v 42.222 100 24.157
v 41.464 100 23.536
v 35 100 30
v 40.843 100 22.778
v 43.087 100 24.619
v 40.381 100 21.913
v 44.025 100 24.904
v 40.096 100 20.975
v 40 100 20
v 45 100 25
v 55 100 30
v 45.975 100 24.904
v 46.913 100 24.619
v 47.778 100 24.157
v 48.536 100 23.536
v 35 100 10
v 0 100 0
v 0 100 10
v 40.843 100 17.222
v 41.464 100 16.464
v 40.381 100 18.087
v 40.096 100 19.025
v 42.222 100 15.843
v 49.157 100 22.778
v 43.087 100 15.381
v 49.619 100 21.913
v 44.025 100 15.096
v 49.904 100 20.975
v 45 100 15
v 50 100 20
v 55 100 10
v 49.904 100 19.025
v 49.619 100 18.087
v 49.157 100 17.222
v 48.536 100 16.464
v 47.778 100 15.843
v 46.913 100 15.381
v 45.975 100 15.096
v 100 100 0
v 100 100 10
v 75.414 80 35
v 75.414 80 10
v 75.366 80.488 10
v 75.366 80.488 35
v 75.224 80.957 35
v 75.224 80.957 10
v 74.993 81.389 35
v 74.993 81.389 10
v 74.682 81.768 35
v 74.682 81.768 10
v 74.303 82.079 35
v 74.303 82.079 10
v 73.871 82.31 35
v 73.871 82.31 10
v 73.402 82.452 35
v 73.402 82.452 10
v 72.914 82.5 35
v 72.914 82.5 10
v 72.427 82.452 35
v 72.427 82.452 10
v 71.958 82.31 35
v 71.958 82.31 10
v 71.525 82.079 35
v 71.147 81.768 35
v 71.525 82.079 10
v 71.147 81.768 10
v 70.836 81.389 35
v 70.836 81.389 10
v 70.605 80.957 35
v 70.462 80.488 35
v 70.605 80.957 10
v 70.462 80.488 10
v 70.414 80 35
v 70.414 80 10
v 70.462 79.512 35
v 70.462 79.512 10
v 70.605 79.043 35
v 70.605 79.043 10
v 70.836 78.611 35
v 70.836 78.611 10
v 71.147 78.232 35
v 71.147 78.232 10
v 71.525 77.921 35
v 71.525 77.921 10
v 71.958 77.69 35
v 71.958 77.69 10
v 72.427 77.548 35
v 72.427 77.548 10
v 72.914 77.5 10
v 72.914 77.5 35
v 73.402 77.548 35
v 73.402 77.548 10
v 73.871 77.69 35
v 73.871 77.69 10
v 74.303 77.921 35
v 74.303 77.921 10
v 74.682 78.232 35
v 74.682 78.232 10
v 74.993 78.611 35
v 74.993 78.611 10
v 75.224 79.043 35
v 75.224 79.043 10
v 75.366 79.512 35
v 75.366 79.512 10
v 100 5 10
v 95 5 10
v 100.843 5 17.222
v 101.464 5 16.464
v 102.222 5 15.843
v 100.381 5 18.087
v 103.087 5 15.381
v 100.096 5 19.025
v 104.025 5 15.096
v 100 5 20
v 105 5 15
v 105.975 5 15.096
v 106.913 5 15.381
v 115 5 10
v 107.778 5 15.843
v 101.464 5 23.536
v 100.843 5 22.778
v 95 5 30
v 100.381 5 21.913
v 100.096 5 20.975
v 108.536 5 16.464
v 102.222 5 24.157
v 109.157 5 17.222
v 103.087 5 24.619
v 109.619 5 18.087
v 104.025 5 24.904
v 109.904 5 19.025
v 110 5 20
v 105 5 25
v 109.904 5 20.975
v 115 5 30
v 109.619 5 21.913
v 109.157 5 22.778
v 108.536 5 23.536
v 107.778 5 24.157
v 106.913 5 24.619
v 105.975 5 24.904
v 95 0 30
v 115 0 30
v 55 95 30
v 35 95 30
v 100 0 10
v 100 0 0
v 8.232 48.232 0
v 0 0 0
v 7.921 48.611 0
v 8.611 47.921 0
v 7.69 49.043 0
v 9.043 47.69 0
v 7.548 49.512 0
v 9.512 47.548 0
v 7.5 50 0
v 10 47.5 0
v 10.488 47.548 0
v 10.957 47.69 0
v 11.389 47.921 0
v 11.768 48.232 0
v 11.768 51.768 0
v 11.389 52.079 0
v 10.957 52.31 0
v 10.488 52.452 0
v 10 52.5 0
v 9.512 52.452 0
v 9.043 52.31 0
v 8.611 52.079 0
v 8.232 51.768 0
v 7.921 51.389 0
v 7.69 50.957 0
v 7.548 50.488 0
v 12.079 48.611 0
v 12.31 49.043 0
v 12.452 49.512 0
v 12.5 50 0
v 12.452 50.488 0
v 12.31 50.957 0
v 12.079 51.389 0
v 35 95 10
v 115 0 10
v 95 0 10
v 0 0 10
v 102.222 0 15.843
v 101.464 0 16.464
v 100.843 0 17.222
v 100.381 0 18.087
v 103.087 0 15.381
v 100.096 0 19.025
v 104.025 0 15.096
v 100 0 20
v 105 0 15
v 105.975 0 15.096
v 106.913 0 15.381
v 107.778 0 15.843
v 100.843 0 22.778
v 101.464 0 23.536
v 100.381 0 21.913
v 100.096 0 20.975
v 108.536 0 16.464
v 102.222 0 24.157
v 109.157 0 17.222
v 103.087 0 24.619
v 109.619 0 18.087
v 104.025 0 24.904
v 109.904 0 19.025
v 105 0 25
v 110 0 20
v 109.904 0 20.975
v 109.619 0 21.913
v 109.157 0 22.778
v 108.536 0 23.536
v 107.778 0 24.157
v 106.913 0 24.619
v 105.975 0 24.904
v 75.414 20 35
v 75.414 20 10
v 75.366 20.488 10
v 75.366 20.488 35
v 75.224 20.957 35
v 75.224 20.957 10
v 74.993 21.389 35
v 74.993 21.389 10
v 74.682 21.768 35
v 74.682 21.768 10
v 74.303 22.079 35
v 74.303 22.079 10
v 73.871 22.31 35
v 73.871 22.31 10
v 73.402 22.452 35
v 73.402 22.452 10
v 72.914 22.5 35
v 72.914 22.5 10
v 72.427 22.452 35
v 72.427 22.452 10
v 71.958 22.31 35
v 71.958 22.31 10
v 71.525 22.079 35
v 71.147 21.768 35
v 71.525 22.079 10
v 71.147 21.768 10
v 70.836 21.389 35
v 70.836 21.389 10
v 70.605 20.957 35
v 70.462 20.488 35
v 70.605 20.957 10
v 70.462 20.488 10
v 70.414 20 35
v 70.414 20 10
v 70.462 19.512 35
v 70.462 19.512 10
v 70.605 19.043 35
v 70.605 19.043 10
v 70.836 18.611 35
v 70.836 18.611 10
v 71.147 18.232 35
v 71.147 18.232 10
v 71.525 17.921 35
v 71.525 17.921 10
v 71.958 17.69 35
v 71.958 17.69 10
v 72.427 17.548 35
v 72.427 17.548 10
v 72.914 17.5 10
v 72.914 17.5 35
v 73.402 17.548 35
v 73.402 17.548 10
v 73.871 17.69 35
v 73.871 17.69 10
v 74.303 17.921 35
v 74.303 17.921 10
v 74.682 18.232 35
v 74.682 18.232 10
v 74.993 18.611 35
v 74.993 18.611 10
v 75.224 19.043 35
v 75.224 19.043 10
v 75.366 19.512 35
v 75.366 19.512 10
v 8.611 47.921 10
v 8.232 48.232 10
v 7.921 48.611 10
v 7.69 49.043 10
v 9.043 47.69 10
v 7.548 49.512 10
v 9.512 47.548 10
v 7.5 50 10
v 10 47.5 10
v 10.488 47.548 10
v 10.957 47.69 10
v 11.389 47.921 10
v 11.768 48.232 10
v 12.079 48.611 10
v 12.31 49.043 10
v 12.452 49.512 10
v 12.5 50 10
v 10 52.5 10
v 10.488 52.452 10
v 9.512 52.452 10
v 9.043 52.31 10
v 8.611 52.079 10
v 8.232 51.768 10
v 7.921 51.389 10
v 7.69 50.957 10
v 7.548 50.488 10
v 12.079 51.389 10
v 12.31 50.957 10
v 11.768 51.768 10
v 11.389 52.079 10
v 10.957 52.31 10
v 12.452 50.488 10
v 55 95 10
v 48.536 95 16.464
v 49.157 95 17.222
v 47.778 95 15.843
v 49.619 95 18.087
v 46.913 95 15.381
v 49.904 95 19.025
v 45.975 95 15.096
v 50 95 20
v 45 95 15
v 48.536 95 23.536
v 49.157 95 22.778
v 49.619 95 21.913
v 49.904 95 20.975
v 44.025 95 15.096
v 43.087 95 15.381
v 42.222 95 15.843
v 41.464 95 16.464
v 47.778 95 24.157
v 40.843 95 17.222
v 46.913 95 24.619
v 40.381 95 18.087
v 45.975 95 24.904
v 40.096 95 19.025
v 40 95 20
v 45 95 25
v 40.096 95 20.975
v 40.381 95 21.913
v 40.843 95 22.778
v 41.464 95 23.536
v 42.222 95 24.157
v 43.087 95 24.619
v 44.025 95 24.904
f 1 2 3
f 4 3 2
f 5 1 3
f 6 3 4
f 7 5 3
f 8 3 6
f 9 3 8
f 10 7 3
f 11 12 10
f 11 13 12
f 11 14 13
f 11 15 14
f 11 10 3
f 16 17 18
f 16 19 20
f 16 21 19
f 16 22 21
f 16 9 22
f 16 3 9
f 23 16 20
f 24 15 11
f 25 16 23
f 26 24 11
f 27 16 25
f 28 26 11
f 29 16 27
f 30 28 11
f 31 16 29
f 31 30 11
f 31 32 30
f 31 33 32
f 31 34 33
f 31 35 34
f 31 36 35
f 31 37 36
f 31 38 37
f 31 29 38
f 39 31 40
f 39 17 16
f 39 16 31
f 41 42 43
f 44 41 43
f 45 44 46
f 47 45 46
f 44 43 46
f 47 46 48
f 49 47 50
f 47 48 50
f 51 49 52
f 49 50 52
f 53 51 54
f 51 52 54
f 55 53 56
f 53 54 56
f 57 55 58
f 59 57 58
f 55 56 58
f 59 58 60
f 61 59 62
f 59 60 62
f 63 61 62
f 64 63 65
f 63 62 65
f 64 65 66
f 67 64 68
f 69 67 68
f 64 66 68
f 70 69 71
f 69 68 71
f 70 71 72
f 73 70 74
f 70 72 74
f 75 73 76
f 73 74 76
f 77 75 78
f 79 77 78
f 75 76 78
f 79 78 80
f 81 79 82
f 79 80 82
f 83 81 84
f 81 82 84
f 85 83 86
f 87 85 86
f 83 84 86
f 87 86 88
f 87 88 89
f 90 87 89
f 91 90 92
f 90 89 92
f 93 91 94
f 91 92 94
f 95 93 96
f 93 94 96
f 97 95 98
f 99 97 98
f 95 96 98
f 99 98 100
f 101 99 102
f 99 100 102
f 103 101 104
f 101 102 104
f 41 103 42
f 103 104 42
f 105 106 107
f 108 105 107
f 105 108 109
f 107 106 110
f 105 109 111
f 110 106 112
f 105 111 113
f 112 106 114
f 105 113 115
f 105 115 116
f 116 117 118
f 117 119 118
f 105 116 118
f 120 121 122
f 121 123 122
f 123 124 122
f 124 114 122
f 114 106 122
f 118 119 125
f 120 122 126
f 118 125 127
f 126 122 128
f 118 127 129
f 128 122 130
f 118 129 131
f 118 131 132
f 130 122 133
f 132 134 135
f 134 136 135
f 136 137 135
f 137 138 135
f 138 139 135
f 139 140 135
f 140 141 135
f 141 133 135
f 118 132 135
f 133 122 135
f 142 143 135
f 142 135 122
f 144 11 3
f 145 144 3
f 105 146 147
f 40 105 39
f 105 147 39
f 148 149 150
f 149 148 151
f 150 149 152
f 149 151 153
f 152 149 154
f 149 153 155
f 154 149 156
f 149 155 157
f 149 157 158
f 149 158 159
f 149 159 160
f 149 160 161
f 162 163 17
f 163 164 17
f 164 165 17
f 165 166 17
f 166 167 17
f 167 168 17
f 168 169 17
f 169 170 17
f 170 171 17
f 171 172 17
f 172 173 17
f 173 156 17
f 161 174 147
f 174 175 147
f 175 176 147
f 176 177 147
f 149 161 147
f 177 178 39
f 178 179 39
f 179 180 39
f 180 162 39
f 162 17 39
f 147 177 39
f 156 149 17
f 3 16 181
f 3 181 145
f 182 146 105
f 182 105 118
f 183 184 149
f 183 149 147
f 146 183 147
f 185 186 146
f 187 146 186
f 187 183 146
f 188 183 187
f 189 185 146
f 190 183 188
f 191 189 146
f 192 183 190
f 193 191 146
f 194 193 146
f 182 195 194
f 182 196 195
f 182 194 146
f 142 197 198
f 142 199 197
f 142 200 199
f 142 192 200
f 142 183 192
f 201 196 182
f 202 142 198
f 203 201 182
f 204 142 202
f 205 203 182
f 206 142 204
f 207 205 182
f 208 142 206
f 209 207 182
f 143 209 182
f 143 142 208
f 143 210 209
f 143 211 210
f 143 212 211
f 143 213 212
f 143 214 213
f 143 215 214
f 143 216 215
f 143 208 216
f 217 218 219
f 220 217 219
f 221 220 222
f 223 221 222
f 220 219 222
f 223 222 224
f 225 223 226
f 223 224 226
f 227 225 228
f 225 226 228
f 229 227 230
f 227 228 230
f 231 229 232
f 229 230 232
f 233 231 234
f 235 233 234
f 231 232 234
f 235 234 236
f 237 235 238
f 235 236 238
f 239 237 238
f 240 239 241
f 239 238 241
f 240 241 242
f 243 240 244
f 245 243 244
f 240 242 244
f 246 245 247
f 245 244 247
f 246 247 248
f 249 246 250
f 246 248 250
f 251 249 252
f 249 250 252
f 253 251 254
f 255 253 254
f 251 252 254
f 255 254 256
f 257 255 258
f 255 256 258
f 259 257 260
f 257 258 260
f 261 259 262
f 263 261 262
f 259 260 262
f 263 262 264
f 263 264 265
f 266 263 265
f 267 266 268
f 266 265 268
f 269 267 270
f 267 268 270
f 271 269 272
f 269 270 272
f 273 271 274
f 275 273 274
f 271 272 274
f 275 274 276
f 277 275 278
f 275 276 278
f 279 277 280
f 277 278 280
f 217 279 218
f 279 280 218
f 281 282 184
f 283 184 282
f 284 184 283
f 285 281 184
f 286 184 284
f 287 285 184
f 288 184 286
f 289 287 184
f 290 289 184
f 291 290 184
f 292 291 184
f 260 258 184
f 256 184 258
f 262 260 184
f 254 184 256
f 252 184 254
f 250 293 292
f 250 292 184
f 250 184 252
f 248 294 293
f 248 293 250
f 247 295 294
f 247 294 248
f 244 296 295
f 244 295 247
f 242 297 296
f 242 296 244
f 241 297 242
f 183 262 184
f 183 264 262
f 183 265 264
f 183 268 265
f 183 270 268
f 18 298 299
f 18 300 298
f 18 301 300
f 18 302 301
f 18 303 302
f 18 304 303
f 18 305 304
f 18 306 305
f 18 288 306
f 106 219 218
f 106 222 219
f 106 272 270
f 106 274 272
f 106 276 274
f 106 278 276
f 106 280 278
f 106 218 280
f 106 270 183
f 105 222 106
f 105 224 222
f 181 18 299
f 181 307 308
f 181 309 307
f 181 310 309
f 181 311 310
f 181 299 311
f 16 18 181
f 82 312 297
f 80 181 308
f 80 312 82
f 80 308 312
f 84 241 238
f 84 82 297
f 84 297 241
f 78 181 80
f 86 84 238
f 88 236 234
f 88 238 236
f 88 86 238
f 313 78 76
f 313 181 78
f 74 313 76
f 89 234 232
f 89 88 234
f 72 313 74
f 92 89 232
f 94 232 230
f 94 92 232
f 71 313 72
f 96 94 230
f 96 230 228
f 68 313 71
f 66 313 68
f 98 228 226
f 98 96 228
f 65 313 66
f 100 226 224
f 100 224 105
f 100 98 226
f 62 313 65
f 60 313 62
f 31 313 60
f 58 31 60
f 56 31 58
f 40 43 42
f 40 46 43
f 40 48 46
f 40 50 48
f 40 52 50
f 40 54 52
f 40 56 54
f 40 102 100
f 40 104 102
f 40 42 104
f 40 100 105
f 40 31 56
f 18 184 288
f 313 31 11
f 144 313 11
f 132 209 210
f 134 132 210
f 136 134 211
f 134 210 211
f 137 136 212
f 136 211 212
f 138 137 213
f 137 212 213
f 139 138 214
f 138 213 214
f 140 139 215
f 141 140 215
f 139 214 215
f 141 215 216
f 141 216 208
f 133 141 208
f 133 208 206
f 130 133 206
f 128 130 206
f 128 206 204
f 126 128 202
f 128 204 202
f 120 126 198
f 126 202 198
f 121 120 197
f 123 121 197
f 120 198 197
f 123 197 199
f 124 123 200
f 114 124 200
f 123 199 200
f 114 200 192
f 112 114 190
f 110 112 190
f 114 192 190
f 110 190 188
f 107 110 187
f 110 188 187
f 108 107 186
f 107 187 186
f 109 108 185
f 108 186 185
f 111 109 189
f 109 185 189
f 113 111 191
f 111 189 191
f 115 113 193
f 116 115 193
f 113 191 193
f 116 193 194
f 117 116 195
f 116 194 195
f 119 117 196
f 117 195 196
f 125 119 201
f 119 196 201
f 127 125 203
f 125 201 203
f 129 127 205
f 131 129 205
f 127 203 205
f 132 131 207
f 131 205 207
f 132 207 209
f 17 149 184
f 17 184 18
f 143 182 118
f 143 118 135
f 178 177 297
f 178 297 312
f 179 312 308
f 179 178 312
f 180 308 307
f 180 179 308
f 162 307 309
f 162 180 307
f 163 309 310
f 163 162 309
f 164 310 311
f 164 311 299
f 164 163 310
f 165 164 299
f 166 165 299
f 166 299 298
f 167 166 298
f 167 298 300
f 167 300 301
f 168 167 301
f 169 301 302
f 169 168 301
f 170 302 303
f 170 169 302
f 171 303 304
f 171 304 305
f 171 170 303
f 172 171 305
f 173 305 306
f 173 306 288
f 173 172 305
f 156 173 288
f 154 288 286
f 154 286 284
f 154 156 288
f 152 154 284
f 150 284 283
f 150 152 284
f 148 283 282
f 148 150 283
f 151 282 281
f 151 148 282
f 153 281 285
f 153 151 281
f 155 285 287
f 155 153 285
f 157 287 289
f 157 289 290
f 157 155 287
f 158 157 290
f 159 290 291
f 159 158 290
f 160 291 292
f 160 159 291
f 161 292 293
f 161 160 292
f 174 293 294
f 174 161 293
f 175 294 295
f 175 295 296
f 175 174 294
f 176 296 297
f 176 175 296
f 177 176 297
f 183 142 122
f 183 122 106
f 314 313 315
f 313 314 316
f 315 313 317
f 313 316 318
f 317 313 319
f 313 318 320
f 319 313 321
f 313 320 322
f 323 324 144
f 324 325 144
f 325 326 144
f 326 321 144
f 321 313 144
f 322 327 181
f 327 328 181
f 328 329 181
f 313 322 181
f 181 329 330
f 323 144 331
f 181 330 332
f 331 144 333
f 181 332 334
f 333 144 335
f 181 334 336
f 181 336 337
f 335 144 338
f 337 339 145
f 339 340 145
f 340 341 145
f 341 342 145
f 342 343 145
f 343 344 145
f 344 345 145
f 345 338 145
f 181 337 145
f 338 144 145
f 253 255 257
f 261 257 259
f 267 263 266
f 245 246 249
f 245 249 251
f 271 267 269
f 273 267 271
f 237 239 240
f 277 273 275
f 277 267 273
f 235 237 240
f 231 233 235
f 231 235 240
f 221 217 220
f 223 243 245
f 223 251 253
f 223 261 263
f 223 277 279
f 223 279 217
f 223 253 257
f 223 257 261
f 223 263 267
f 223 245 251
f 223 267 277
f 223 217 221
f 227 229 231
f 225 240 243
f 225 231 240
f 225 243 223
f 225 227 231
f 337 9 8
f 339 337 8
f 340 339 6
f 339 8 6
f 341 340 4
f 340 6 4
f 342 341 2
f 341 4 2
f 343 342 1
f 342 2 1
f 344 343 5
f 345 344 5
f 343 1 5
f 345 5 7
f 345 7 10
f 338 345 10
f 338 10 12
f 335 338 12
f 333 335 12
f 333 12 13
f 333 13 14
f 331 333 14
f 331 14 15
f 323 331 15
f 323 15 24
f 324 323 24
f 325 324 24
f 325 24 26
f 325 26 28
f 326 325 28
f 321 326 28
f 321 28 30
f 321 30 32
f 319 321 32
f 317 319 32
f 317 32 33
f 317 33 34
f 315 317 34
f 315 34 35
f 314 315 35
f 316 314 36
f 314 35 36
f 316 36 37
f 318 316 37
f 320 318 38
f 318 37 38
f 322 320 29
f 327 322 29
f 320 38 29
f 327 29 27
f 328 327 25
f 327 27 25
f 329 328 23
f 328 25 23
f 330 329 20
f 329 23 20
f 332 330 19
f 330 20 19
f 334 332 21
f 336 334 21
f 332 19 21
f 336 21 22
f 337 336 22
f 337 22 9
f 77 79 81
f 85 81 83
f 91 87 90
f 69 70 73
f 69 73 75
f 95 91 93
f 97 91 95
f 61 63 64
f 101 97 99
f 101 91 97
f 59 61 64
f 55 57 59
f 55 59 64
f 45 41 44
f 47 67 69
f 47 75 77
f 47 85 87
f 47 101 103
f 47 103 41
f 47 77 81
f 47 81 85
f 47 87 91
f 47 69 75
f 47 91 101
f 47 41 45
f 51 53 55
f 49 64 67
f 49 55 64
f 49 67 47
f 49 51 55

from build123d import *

# Parameters (mm, degrees)
F0_W     = 100
F0_H     = 100
F0_R     = 2.5
F1_DEPTH = 10
F2_R     = 2.5
F3_DEPTH = 25
F4_W     = 20
F4_H     = 20
F5_DEPTH = 5
F6_R     = 5
F7_DEPTH = 25
F8_R     = 5
F9_DEPTH = 5


with BuildPart() as f1:
    # F0 (on Top) → F1 (new body)
    with BuildSketch(Plane.XY):
        with Locations((50, 50)):
            Rectangle(F0_W, F0_H)
        with Locations((10, 50)):
            Circle(F0_R, mode=Mode.SUBTRACT)
    extrude(amount=F1_DEPTH)

    # F2 (on face) → F3 (join)
    with BuildSketch(Plane.XY.offset(10)):
        with Locations((72.9144066572, 20)):
            Circle(F2_R)
        with Locations((72.9144066572, 80)):
            Circle(F2_R)
    extrude(amount=F3_DEPTH)

    # F4 (on face) → F5 (join)
    with BuildSketch(Plane(origin=(0, 100, 0), x_dir=(-1, 0, 0), z_dir=(0, 1, 0))):
        with Locations((-45, 20)):
            Rectangle(F4_W, F4_H)
    extrude(amount=-F5_DEPTH)

    # F6 (on face) → F7 (cut)
    with BuildSketch(Plane(origin=(0, 100, 0), x_dir=(-1, 0, 0), z_dir=(0, 1, 0))):
        with Locations((-45, 20)):
            Circle(F6_R)
    extrude(amount=-F7_DEPTH, mode=Mode.SUBTRACT)

    # F8 (on face) → F9 (join)
    with BuildSketch(Plane.XZ):
        Polygon((95, 30), (95, 10), (100, 10), (115, 10), (115, 30), align=None)
        with Locations((105, 20)):
            Circle(F8_R, mode=Mode.SUBTRACT)
    extrude(amount=-F9_DEPTH)


solid = f1.part
